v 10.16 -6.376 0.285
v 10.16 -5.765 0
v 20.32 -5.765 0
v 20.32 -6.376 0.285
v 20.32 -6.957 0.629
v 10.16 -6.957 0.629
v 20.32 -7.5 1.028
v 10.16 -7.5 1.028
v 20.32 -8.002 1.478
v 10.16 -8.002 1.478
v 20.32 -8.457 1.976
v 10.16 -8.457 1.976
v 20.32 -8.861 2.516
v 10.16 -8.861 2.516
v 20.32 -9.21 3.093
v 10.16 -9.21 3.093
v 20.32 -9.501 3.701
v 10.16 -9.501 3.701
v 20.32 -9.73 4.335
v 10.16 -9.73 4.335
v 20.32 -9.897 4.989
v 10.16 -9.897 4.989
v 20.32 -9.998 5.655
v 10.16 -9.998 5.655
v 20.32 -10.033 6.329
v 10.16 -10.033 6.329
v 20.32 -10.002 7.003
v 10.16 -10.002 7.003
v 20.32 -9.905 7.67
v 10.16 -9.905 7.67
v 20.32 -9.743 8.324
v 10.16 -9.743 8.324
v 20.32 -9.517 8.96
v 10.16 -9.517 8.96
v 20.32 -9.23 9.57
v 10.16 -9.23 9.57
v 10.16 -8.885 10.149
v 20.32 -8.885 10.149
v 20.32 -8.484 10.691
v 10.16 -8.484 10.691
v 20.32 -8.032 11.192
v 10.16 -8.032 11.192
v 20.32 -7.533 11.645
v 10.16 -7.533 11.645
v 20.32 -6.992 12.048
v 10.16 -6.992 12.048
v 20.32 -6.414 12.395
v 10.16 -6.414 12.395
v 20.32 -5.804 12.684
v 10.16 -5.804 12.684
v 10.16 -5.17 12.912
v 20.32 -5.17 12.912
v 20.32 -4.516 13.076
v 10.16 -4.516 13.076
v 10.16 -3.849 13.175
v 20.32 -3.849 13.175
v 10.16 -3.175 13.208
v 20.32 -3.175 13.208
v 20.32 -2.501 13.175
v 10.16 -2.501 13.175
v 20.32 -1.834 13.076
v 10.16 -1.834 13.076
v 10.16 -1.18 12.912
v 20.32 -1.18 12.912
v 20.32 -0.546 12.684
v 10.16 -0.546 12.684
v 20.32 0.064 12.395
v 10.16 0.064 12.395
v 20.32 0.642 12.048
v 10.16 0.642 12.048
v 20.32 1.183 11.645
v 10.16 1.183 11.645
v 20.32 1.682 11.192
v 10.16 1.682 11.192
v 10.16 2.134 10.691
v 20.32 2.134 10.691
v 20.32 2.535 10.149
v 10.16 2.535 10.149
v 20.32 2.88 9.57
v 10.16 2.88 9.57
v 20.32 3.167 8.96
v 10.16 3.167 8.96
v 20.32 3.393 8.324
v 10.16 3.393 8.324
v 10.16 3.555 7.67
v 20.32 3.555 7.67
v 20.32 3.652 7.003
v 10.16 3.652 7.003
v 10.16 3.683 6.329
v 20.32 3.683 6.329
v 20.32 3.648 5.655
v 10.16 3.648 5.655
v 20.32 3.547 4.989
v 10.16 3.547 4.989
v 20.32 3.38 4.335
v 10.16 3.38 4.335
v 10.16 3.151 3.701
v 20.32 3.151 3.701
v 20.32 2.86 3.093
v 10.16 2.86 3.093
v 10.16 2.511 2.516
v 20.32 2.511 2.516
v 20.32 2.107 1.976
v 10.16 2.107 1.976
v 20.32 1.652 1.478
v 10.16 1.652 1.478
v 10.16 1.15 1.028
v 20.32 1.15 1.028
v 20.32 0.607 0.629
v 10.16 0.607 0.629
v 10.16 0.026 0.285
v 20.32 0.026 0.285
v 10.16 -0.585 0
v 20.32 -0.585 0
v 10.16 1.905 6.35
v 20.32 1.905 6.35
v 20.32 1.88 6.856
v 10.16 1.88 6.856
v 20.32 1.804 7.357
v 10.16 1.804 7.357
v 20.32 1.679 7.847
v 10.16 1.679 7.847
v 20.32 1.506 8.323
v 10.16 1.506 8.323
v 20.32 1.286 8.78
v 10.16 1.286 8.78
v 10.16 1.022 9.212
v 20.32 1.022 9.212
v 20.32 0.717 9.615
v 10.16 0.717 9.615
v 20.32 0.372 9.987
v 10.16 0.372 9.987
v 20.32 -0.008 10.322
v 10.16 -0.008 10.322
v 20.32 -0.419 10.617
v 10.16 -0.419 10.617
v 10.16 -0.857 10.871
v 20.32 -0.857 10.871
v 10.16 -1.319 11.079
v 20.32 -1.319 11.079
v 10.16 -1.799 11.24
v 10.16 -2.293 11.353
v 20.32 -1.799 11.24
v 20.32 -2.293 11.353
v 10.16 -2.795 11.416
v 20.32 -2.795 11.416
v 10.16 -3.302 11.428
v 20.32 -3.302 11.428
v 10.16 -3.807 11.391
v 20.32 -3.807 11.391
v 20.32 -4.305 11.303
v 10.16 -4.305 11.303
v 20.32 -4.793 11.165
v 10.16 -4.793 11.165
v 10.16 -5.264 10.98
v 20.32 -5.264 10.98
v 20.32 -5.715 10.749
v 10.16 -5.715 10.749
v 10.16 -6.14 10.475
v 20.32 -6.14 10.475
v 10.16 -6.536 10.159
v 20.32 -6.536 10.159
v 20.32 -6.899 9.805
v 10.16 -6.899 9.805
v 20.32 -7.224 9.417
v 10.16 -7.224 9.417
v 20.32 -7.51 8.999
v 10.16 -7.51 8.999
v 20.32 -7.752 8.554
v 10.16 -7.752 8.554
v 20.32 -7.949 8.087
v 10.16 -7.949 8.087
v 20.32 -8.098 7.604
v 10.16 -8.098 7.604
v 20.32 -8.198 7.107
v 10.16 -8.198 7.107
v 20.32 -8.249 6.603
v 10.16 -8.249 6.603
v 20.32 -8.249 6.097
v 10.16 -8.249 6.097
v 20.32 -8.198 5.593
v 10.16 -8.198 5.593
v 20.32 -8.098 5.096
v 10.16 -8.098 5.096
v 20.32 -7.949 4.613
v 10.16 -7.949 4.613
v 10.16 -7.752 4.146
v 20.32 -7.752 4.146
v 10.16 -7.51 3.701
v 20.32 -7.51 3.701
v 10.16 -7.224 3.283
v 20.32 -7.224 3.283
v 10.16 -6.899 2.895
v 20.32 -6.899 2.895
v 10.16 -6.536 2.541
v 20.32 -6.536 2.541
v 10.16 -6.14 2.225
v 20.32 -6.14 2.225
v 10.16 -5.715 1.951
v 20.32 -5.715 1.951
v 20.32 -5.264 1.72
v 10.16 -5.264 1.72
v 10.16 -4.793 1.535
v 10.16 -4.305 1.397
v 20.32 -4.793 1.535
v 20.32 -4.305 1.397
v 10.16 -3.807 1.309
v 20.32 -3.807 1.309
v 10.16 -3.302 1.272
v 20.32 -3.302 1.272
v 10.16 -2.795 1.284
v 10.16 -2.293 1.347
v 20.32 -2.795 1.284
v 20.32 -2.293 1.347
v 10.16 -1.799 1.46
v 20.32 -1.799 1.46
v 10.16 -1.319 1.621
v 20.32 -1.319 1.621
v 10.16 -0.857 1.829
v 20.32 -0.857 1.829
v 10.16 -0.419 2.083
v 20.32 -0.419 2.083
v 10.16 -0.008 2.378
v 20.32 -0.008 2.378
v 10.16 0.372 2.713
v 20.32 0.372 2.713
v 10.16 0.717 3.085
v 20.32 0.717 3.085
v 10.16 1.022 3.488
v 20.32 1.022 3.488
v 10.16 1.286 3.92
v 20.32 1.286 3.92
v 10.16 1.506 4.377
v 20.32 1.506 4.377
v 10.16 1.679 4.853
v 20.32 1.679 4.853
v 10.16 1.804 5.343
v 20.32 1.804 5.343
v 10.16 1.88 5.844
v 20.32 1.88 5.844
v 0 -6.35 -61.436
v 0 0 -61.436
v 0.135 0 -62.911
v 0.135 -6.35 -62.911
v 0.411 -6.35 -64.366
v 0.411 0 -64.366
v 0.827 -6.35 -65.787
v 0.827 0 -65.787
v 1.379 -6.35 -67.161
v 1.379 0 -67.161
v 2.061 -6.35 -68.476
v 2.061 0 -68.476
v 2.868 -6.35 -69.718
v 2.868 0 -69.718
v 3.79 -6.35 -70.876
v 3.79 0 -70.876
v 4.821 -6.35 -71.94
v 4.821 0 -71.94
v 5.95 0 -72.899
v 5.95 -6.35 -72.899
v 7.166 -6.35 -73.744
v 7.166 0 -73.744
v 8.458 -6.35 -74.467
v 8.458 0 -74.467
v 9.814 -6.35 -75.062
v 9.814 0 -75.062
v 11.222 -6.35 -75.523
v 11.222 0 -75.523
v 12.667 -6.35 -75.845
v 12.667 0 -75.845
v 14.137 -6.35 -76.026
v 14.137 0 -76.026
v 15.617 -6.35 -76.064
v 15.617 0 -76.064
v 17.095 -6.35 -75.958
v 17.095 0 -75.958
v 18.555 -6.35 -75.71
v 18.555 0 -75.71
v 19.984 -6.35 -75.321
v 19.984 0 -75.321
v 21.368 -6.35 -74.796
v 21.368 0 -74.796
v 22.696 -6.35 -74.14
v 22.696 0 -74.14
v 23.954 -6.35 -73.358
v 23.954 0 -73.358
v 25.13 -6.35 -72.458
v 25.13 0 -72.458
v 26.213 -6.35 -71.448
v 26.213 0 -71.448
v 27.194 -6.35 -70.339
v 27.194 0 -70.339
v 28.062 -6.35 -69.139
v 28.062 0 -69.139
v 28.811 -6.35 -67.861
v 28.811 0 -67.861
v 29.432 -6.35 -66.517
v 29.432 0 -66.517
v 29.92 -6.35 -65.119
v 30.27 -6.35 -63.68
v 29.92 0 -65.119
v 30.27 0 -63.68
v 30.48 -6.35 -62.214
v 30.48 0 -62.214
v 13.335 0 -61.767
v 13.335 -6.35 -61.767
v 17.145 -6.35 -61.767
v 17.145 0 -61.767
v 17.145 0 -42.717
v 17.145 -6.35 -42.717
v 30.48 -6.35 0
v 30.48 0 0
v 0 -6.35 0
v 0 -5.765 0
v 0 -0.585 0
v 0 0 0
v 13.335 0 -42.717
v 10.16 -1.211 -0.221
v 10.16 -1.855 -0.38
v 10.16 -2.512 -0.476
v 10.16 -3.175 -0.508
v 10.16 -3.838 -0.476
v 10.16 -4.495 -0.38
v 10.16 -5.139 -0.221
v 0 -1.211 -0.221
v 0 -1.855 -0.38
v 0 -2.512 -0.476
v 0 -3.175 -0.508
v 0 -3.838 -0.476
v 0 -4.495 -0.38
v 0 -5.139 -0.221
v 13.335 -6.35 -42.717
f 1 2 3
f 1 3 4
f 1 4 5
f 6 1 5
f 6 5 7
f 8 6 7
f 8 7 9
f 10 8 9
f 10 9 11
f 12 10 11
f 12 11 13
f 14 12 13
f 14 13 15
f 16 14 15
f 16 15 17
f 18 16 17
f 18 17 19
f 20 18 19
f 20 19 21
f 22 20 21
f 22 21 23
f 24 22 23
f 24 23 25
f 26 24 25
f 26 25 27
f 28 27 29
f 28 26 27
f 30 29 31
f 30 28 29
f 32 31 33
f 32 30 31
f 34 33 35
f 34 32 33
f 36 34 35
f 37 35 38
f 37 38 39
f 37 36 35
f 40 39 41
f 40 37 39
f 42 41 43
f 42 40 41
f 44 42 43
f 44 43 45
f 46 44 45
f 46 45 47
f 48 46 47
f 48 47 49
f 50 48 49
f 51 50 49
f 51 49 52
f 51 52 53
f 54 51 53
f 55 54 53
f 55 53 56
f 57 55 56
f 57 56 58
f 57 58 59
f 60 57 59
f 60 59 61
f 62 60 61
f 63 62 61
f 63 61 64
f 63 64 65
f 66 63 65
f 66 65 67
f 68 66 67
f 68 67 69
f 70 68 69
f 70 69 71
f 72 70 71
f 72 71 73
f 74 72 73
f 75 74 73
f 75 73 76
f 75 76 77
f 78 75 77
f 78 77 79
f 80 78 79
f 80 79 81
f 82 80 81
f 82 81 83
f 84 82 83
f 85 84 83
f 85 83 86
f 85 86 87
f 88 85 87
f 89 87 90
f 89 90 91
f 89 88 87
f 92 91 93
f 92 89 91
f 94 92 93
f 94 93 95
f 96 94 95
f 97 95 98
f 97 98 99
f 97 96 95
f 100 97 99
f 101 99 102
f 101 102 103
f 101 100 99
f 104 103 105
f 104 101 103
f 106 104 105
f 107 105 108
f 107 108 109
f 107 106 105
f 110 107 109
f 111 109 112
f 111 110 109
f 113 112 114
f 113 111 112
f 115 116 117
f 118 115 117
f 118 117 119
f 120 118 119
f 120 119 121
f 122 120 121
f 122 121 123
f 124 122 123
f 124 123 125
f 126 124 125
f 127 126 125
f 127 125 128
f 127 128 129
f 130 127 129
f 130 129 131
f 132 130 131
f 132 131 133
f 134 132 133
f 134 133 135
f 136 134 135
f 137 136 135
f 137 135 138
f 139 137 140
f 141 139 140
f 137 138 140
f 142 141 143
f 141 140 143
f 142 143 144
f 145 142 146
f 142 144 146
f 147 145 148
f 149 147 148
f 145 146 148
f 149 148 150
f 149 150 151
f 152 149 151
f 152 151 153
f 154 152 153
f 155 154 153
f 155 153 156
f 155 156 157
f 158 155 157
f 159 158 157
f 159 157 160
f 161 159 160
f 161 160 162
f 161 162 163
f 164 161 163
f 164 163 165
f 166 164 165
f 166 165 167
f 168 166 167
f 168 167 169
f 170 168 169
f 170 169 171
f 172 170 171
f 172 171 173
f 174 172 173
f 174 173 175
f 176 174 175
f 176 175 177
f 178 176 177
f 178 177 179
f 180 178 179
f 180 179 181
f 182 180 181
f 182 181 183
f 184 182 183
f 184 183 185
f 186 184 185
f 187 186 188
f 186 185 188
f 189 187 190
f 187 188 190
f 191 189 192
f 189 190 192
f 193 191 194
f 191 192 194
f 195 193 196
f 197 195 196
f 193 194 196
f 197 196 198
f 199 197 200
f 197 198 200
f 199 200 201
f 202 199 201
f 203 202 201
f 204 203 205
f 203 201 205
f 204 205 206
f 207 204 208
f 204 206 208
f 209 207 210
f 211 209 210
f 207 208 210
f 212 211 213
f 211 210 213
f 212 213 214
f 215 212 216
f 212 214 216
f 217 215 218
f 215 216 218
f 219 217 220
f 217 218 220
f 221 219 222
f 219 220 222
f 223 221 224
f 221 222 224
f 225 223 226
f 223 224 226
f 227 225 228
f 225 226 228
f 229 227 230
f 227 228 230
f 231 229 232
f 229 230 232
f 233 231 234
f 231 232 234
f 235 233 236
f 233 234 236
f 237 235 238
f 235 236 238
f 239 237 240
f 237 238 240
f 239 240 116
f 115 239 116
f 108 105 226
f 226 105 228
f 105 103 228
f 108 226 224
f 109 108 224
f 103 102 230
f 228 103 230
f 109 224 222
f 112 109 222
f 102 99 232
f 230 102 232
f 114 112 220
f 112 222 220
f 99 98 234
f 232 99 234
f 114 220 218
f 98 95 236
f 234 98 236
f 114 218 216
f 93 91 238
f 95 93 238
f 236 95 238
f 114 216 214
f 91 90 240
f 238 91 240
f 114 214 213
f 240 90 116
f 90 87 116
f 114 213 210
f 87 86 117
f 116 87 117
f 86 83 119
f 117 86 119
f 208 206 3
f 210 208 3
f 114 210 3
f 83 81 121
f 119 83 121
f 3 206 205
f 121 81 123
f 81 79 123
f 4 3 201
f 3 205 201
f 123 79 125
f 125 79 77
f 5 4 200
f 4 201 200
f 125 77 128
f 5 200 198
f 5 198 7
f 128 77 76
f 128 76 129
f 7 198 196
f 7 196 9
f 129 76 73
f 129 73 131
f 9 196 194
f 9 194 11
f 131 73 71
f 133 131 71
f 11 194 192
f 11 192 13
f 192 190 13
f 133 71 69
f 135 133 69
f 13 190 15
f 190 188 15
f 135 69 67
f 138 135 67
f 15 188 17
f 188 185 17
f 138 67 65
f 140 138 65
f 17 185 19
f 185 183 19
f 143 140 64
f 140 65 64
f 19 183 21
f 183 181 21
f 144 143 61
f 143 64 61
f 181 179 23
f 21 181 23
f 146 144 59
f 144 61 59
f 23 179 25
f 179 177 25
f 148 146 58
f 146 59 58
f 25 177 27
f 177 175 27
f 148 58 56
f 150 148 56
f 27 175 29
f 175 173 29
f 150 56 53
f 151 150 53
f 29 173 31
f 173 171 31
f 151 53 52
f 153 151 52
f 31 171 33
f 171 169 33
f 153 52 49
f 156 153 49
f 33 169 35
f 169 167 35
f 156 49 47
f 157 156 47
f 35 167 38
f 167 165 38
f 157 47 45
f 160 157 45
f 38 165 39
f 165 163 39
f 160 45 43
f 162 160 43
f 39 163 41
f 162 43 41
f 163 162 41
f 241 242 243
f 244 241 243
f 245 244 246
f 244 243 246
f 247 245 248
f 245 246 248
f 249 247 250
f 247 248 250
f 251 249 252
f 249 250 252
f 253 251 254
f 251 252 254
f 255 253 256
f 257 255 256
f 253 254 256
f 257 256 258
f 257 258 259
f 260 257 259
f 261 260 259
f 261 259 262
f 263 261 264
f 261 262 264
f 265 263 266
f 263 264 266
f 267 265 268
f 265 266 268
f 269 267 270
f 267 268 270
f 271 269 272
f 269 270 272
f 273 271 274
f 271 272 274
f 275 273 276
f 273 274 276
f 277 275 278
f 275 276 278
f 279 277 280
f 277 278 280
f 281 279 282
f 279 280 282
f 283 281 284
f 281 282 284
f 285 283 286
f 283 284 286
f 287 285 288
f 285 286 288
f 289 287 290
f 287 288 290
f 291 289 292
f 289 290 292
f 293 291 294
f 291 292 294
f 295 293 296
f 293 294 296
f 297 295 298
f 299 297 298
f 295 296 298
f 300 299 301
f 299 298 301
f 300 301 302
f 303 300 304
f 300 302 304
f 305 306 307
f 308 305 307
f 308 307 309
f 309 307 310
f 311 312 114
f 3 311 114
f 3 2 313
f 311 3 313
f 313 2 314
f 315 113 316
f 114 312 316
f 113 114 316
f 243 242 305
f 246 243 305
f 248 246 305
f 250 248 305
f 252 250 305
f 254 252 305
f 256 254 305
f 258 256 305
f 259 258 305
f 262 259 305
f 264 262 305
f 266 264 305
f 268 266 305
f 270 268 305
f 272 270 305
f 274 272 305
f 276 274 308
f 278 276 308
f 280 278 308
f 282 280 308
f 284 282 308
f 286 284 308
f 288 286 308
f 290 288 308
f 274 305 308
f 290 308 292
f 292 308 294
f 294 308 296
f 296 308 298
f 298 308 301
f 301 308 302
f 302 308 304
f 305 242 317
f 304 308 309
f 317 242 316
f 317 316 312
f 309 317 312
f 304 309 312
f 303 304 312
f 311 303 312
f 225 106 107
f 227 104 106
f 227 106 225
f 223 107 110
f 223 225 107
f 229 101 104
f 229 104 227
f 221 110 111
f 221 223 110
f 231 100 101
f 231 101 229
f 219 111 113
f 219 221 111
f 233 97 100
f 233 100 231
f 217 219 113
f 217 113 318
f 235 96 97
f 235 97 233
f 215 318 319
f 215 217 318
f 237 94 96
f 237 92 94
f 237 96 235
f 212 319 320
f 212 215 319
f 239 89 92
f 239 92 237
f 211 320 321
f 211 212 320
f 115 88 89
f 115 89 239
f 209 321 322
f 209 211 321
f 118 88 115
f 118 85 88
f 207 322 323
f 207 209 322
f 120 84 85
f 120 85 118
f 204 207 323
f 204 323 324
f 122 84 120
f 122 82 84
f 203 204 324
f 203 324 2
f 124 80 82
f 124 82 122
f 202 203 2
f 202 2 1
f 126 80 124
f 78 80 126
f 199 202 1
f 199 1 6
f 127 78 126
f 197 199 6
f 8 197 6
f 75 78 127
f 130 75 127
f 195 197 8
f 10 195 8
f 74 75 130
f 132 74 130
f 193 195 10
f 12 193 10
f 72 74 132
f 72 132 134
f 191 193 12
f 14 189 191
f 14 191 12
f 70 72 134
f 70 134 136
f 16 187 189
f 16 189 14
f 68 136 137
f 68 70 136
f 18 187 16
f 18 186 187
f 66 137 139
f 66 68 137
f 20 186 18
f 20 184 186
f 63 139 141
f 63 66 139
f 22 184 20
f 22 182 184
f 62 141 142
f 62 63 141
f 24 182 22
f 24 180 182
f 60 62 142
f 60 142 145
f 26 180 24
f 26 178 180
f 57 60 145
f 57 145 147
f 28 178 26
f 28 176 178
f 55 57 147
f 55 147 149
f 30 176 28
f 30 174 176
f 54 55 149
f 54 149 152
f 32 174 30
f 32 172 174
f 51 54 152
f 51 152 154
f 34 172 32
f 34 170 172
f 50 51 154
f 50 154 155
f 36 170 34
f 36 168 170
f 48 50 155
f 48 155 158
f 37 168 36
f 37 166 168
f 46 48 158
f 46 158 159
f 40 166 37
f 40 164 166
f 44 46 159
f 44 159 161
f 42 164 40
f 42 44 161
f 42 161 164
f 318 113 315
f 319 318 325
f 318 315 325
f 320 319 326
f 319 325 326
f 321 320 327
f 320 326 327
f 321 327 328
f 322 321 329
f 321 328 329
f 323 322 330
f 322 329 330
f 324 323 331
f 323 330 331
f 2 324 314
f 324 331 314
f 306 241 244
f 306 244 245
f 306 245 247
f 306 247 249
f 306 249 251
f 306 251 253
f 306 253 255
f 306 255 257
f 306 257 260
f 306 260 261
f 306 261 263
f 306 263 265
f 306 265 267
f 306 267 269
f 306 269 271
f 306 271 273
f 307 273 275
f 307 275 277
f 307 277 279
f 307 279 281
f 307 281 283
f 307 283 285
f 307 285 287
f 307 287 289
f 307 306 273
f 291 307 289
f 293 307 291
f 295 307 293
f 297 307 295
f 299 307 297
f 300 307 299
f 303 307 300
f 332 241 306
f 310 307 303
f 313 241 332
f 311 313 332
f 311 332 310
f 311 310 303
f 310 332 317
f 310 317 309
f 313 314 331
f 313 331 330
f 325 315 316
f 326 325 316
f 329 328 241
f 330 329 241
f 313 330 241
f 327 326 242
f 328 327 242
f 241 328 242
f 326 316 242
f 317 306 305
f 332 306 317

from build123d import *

# Parameters (mm, degrees)
F1_DEPTH      = 6.35
F2_R          = 6.858
F3_DEPTH      = 10.16
F3_DEPTH_BACK = 20.32
F4_R          = 5.08
F5_DEPTH      = 30.48
F6_DEPTH      = 20.32
F7_W          = 3.81
F7_H          = 19.05
F8_DEPTH      = 25.4


with BuildPart() as f1:
    # F0 (on Front) → F1 (new body)
    with BuildSketch(Plane.XZ):
        with BuildLine():
            Line((30.48, 0), (0, 0))
            Line((0, 0), (0, -61.4362284541))
            ThreePointArc((0, -61.4362284541), (14.8767406092, -76.0626361349), (30.48, -62.2138993989))
            Line((30.48, -62.2138993989), (30.48, -59.360794723))
            Line((30.48, -59.360794723), (30.48, 0))
        make_face()
    extrude(amount=F1_DEPTH)

    # F2 (on face) → F3 (join, two sides)
    with BuildSketch(Plane(origin=(0, 0, 0), x_dir=(0, -1, 0), z_dir=(-1, 0, 0))) as f3_sk:
        with Locations((3.175, 6.35)):
            Circle(F2_R)
    extrude(amount=F3_DEPTH)
    extrude(f3_sk.sketch, amount=-F3_DEPTH_BACK)

    # F4 (on face) → F5 (cut)
    with BuildSketch(Plane.YZ.offset(30.48)):
        with Locations((-3.175, 6.35)):
            Circle(F4_R)
    extrude(amount=-F5_DEPTH, mode=Mode.SUBTRACT)

    # F6 (cut): a face of the model
    f6_faces = [f1.faces().sort_by_distance(p)[0] for p in [
        (-10.16, -3.175, 6.35),
    ]]
    extrude(f6_faces, amount=-F6_DEPTH, mode=Mode.SUBTRACT)

    # F7 (on face) → F8 (cut)
    with BuildSketch(Plane.XZ.offset(6.35)):
        with Locations((15.24, -52.242487669)):
            Rectangle(F7_W, F7_H)
    extrude(amount=-F8_DEPTH, mode=Mode.SUBTRACT)


solid = f1.part
